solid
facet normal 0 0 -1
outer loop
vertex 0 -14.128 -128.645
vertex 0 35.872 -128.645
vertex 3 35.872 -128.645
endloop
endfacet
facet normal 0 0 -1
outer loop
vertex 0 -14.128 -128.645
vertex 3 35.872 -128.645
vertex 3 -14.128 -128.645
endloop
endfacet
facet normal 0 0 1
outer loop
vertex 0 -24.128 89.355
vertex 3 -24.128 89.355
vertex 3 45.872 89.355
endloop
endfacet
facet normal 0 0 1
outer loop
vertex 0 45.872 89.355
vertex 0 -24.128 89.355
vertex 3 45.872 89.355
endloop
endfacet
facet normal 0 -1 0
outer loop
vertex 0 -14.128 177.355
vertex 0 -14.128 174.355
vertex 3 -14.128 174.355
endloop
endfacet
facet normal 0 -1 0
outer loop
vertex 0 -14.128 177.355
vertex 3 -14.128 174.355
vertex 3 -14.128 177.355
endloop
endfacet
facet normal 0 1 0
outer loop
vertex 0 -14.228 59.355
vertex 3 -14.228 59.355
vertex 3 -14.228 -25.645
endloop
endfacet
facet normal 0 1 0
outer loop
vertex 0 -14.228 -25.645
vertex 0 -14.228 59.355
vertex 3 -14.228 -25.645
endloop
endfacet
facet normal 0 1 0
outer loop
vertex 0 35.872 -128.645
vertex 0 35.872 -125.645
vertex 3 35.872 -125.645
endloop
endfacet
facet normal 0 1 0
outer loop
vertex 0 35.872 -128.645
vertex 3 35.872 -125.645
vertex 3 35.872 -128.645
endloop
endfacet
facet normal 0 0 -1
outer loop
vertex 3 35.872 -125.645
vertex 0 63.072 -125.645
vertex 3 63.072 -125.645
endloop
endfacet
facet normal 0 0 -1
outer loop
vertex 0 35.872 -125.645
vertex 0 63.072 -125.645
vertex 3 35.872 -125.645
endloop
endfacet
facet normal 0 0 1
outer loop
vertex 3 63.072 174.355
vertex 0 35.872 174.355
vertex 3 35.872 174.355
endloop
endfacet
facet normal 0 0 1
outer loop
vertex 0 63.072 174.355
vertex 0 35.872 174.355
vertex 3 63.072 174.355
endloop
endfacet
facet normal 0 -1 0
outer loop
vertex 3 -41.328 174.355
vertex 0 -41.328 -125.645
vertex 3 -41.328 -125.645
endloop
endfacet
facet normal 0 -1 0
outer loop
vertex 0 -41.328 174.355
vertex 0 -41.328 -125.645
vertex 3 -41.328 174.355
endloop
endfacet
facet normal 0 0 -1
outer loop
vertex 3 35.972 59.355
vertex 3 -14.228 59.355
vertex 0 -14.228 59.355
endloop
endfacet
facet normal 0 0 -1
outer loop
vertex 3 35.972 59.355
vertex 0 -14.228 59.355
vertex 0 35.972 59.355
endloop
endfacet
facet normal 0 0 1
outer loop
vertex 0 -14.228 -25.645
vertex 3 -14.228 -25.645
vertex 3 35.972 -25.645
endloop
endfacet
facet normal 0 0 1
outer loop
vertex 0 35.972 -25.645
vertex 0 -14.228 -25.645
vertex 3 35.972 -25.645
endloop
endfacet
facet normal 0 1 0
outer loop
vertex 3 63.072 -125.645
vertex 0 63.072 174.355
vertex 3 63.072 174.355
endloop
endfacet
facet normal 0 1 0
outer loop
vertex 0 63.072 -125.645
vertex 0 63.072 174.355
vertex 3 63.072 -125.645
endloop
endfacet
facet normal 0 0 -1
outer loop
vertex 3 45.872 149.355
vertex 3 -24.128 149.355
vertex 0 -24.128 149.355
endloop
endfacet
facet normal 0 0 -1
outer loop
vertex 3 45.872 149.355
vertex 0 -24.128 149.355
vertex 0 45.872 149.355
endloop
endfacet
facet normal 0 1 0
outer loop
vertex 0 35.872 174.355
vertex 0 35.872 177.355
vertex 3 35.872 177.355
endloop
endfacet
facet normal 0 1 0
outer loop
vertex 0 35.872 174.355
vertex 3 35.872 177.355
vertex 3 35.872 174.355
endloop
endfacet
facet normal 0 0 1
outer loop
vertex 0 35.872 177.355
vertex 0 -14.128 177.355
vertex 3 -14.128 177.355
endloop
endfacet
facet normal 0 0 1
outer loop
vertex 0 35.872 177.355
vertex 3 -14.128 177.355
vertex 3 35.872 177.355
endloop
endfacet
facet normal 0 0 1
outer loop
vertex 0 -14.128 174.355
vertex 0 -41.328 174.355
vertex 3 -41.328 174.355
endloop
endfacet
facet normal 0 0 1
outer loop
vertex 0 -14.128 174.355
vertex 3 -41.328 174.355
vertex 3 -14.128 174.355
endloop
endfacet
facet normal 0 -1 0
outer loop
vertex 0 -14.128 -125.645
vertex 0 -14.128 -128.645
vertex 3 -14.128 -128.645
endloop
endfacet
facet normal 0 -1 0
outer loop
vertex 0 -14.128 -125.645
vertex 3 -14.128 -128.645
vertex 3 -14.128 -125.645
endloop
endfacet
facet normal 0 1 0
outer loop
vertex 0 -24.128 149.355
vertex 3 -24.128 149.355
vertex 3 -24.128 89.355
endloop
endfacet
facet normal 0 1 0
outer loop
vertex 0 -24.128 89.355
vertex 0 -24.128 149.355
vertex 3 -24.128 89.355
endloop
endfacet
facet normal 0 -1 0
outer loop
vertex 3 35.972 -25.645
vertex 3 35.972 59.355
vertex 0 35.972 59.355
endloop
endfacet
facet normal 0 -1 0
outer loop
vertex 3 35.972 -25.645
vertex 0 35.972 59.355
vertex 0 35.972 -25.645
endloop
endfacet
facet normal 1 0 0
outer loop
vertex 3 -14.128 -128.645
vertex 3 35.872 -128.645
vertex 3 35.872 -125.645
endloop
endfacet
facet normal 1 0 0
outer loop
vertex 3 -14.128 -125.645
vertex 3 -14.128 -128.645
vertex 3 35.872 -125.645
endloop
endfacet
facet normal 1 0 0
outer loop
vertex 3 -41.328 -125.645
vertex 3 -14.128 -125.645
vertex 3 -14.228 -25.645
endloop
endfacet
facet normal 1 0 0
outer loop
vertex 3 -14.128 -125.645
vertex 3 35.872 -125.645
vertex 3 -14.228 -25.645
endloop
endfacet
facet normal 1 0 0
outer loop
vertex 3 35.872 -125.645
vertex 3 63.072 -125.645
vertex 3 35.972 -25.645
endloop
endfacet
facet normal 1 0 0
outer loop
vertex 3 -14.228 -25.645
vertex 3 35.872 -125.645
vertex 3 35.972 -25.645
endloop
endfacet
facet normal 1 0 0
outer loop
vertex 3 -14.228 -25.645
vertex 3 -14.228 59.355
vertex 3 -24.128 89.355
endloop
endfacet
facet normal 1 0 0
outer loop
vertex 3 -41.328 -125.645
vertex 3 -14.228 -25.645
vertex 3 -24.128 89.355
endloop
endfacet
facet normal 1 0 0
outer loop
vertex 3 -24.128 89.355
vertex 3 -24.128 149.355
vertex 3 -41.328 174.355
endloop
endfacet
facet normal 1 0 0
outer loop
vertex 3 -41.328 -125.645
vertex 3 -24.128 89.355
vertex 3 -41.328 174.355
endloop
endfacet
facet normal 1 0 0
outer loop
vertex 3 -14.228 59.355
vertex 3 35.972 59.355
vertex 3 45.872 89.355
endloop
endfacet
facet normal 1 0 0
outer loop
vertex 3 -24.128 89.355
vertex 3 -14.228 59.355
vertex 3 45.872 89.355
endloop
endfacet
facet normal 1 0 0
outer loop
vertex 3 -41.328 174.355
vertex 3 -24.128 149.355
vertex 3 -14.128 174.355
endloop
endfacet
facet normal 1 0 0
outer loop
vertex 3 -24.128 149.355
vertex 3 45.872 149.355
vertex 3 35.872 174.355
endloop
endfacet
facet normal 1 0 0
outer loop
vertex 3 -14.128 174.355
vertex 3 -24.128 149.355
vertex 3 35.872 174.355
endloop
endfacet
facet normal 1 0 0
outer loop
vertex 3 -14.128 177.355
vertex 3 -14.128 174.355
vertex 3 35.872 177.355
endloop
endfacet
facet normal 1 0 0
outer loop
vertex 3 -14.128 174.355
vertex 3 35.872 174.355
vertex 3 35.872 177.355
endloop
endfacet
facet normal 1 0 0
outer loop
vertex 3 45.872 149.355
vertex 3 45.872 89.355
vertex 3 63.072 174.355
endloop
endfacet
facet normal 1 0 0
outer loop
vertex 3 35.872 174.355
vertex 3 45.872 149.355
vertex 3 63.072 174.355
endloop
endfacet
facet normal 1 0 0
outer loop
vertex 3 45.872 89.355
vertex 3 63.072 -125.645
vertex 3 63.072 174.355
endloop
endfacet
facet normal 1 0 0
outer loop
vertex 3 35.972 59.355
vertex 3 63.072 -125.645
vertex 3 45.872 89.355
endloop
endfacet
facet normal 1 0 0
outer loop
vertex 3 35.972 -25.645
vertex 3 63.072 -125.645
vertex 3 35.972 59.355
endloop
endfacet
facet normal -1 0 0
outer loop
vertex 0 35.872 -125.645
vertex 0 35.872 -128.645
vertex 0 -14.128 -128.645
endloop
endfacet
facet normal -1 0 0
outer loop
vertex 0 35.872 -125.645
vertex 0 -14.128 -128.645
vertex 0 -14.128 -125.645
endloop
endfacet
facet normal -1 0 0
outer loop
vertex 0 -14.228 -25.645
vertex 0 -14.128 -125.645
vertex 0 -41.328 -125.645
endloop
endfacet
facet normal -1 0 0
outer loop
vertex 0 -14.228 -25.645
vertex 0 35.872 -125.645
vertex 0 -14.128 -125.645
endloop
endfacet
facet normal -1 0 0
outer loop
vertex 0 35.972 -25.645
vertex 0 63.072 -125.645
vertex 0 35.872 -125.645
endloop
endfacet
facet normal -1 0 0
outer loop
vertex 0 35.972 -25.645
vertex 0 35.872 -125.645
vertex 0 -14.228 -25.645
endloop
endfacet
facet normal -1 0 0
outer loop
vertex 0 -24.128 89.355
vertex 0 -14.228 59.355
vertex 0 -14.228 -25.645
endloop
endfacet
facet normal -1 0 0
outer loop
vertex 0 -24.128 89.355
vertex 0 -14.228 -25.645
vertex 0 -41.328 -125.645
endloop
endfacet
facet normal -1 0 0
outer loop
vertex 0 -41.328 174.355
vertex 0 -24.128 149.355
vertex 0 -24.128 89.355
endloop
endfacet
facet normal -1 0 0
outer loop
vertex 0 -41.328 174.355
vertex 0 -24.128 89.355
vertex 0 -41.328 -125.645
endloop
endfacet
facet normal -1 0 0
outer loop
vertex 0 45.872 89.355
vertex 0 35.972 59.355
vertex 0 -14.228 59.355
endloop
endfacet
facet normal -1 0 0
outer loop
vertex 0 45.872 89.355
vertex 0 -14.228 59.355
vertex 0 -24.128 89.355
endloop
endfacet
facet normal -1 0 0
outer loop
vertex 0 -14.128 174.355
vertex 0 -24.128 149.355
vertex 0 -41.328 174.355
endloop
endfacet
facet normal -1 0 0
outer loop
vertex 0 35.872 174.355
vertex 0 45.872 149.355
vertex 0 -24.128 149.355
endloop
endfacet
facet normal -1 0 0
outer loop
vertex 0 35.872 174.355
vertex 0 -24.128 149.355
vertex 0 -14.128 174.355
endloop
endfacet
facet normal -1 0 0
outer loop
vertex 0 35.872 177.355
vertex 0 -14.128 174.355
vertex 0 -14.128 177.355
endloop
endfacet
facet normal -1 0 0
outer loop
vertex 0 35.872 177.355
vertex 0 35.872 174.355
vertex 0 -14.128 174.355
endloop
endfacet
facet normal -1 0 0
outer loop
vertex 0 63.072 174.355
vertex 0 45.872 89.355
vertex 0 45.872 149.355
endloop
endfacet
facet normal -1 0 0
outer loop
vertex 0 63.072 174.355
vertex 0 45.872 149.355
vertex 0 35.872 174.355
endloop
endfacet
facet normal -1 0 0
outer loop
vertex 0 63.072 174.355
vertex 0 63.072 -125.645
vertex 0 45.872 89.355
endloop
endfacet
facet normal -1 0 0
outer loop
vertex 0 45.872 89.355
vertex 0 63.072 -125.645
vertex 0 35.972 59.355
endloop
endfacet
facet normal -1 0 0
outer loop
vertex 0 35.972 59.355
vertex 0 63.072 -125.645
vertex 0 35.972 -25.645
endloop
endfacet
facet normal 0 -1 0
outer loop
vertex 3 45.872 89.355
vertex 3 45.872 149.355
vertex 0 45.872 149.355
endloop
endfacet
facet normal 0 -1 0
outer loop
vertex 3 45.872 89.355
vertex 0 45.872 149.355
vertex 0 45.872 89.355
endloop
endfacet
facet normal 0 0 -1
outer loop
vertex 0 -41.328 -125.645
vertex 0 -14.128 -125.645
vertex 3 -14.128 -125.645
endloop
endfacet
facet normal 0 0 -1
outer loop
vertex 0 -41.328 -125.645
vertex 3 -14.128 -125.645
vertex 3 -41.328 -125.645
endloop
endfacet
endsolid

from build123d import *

# Parameters (mm, degrees)
BOSS_EXTRUDE1_DEPTH = 3
SKETCH2_W           = 60
SKETCH2_H           = 70
CUT_EXTRUDE1_DEPTH  = 10
SKETCH3_W           = 85
SKETCH3_H           = 50.2
CUT_EXTRUDE2_DEPTH  = 10


with BuildPart() as part:
    # Sketch1 → Boss-Extrude1 (new body)
    with BuildSketch(Plane(origin=(0, 0, 0), x_dir=(0, 0, -1), z_dir=(1, 0, 0))):
        Polygon((-174.354709419, 63.071743487), (125.645290581, 63.071743487), (125.645290581, 35.871743487), (128.645290581, 35.871743487), (128.645290581, -14.128256513), (125.645290581, -14.128256513), (125.645290581, -41.328256513), (-174.354709419, -41.328256513), (-174.354709419, -14.128256513), (-177.354709419, -14.128256513), (-177.354709419, 35.871743487), (-174.354709419, 35.871743487), align=None)
    extrude(amount=BOSS_EXTRUDE1_DEPTH)

    # Sketch2 → Cut-Extrude1 (cut)
    with BuildSketch(Plane(origin=(3, 0, 0), x_dir=(0, 0, -1), z_dir=(1, 0, 0))):
        with Locations((-119.354709419, 10.871743487)):
            Rectangle(SKETCH2_W, SKETCH2_H)
    extrude(amount=-CUT_EXTRUDE1_DEPTH, mode=Mode.SUBTRACT)

    # Sketch3 → Cut-Extrude2 (cut)
    with BuildSketch(Plane(origin=(3, 0, 0), x_dir=(0, 0, -1), z_dir=(1, 0, 0))):
        with Locations((-16.854709419, 10.871743487)):
            Rectangle(SKETCH3_W, SKETCH3_H)
    extrude(amount=-CUT_EXTRUDE2_DEPTH, mode=Mode.SUBTRACT)


solid = part.part
